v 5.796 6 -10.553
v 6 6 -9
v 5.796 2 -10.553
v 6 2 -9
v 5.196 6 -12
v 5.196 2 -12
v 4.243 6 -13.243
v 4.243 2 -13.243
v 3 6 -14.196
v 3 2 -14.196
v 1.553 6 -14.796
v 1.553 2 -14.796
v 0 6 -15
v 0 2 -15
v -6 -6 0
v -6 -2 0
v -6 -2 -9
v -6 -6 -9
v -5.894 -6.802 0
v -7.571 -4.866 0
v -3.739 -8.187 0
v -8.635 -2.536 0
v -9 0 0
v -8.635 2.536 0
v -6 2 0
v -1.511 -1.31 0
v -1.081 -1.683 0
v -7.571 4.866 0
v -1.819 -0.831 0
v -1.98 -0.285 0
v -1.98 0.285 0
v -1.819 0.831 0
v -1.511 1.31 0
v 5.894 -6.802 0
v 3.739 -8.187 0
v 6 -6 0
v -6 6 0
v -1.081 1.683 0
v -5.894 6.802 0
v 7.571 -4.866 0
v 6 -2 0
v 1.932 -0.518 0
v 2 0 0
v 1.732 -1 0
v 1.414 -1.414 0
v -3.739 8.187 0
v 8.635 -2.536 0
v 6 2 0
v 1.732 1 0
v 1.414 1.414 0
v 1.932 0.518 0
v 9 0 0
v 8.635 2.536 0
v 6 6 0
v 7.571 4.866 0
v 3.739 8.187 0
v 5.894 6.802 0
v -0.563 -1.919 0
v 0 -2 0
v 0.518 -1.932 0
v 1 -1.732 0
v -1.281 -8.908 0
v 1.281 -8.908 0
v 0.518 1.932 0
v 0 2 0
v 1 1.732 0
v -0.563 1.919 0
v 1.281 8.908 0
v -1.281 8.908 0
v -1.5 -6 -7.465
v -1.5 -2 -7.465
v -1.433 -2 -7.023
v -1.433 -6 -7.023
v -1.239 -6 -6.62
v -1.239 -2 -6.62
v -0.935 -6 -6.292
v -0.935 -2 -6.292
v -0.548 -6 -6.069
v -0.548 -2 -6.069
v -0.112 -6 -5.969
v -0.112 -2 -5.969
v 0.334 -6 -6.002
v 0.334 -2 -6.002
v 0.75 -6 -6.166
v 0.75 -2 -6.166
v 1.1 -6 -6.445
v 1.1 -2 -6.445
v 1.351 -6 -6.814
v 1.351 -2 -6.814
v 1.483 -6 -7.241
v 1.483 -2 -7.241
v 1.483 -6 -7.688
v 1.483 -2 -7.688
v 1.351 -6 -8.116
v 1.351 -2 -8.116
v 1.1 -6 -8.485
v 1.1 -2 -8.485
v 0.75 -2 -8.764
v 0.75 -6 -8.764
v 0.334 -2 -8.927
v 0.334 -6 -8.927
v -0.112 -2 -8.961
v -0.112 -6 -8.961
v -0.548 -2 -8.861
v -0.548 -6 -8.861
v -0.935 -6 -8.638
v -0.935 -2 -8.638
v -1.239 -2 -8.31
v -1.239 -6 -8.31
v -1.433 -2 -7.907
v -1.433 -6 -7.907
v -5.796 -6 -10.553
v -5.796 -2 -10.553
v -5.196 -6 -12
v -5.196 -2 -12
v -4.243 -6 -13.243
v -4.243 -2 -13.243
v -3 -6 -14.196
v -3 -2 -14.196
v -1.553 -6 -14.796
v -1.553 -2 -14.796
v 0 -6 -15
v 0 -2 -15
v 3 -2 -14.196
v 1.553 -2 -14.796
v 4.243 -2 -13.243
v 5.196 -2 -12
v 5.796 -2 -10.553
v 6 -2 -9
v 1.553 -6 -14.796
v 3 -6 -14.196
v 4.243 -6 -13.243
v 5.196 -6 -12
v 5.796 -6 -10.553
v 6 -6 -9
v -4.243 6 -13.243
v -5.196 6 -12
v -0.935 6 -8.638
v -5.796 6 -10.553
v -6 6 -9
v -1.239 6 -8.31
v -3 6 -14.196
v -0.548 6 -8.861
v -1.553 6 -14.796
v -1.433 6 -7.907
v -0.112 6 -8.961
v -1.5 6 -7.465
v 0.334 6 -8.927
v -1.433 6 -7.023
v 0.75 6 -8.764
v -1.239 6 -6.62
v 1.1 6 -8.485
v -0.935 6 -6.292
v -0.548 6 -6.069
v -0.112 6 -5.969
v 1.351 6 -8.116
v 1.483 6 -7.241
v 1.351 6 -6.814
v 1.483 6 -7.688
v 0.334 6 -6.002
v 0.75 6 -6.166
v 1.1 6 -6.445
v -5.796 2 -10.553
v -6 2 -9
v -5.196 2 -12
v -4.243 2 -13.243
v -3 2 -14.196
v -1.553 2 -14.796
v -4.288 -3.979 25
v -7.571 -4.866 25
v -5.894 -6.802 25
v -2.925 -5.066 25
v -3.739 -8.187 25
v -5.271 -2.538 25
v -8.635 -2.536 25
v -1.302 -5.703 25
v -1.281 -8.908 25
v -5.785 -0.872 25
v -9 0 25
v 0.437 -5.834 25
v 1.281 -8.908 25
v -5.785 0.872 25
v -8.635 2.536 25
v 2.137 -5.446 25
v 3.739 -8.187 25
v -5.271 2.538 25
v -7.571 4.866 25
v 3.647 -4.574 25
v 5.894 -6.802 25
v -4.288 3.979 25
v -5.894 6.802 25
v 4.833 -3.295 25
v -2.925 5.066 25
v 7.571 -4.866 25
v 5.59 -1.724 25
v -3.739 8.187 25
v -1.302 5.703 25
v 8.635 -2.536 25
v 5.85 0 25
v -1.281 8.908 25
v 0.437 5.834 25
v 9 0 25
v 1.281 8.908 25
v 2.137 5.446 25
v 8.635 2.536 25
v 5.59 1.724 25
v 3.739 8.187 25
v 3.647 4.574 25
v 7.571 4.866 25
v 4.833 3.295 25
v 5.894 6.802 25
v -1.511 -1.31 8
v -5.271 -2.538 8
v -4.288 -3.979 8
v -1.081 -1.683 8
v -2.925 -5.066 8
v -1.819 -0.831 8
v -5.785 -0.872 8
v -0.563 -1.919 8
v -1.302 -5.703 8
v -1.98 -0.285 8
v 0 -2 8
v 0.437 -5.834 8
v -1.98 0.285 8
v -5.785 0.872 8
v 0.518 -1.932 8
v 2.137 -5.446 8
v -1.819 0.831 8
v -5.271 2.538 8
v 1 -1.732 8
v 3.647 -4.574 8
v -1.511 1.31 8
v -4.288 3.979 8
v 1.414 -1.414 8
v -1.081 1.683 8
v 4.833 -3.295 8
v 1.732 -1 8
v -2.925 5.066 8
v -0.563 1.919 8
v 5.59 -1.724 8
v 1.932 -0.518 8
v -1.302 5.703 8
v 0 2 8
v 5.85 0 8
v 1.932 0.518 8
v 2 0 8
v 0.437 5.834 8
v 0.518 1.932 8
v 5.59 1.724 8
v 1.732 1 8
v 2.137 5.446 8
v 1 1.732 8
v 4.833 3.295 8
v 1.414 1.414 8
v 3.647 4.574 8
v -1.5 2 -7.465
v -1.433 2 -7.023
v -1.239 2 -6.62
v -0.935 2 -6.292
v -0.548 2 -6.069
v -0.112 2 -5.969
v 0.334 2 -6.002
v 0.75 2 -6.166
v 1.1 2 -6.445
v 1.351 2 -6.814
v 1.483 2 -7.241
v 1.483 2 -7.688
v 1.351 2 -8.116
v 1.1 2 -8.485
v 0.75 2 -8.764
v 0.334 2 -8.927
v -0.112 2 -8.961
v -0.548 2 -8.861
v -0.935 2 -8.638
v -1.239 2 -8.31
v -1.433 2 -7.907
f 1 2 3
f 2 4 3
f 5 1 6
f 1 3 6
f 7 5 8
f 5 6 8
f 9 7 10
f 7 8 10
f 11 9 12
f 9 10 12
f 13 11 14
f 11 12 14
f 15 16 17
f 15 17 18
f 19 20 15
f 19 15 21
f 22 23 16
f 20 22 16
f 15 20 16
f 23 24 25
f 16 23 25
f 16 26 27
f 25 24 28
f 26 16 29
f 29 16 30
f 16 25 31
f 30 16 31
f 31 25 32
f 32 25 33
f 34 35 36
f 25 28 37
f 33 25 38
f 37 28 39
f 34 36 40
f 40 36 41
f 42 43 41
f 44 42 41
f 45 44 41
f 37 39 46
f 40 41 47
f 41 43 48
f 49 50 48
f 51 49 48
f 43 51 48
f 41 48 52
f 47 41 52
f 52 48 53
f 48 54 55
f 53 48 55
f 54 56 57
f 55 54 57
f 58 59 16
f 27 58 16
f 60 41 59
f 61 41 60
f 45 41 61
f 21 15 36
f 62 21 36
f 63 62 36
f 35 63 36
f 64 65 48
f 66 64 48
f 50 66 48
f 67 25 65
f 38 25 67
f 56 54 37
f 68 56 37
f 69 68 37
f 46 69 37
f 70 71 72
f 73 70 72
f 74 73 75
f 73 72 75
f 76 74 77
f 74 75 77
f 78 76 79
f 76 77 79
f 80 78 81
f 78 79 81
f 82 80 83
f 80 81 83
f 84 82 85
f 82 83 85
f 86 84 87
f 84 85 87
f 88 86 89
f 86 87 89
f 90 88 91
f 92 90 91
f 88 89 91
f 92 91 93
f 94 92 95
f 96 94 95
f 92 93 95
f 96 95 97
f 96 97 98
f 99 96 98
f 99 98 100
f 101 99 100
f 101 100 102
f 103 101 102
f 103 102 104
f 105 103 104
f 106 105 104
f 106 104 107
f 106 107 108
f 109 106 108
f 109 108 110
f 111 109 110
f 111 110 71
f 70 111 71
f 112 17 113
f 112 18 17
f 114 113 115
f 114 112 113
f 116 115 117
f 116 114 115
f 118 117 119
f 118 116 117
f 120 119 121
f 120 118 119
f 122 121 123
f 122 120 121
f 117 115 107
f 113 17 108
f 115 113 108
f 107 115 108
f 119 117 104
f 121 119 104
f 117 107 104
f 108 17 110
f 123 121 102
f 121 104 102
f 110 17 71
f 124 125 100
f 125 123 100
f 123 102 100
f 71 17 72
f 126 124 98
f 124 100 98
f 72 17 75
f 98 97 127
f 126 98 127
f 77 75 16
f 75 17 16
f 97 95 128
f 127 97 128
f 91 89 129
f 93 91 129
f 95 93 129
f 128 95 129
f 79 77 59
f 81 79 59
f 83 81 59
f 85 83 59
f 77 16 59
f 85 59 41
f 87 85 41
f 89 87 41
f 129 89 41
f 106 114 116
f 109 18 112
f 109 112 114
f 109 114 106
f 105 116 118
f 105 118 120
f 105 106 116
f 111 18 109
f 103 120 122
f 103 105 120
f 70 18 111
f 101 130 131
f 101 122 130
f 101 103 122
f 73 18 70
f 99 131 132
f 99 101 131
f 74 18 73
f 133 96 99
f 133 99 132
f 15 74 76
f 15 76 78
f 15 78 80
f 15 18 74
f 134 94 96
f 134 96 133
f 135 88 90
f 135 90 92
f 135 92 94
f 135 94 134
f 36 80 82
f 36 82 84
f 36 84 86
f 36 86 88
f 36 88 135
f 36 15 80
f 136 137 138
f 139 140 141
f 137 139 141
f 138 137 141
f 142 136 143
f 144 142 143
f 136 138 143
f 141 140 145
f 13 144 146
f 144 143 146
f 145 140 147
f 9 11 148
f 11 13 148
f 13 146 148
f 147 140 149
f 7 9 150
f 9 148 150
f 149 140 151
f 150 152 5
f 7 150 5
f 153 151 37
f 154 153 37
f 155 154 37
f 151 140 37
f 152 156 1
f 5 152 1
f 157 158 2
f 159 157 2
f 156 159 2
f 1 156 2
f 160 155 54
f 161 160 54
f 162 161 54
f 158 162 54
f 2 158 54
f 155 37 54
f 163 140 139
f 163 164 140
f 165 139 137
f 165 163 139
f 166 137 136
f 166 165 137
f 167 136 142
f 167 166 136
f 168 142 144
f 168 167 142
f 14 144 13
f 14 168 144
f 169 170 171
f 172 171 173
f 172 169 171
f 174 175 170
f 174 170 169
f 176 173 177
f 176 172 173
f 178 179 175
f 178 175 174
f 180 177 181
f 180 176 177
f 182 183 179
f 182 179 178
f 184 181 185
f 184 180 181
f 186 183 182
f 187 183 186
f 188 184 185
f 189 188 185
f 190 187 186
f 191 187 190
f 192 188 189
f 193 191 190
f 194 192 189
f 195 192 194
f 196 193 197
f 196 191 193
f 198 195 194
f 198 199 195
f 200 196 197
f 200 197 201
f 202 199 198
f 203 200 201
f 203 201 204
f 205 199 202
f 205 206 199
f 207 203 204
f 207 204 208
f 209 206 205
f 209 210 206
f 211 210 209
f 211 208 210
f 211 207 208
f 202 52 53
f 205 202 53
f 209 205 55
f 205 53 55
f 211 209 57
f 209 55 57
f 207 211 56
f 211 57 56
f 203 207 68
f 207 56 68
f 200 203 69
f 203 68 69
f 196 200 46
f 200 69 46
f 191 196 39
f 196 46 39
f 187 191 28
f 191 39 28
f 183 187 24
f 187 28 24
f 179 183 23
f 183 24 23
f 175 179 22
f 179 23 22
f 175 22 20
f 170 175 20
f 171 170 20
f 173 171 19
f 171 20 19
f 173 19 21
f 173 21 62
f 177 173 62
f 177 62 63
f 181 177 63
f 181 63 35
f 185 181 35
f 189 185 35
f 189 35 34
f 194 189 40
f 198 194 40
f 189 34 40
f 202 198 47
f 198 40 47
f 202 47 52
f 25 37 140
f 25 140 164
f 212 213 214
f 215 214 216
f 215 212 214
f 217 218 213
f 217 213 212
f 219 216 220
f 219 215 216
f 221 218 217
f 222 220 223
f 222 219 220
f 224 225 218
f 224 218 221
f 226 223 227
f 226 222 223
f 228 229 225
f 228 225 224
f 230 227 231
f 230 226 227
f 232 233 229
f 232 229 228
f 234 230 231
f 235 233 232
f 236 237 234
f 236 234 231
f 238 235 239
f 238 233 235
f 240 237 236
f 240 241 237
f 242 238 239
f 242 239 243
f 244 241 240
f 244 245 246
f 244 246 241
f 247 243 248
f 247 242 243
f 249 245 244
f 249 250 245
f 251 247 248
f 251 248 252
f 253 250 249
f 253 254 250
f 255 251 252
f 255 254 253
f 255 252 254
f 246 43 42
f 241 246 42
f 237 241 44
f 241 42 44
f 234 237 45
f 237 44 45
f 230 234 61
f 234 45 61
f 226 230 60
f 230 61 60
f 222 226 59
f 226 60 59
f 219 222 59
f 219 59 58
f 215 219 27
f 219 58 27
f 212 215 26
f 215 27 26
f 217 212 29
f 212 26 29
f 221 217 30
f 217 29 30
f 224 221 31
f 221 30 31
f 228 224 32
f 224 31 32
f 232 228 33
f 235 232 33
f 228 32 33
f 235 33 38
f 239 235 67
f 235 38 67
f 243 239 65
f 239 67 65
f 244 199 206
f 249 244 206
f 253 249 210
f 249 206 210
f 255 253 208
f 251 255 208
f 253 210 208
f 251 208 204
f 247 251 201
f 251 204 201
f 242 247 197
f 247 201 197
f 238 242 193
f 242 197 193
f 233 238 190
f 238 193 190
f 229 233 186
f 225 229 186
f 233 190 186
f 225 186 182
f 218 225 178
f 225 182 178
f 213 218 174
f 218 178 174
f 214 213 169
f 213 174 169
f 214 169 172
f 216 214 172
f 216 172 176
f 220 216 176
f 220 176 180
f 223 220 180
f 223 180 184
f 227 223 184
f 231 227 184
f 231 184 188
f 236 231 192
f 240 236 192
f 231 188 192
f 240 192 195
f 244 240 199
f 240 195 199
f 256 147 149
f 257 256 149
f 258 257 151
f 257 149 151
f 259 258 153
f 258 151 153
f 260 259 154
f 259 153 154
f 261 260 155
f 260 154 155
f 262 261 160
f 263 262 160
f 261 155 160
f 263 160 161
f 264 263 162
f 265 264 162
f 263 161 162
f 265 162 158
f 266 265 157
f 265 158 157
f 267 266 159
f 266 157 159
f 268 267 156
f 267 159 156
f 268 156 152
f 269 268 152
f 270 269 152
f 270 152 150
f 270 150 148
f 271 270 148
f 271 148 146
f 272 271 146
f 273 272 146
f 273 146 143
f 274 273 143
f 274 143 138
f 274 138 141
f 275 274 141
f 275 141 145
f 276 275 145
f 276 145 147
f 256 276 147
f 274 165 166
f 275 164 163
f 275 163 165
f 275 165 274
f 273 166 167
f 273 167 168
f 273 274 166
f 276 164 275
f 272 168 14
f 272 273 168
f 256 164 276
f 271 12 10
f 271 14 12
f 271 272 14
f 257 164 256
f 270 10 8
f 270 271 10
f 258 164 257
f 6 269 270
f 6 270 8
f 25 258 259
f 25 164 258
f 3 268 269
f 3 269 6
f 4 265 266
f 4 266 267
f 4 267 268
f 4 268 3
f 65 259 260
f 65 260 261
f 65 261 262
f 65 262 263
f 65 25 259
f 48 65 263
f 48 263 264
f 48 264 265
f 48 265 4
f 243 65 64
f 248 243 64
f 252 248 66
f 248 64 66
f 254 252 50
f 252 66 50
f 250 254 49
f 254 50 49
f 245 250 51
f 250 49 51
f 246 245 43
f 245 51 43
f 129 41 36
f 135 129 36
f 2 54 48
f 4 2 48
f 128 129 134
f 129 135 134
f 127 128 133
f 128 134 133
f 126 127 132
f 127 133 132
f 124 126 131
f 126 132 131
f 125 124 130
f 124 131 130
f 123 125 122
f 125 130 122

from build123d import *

# Parameters (mm, degrees)
F0_R      = 9
F1_DEPTH  = 25
F2_W      = 12
F2_H      = 4
F3_DEPTH  = 15
F4_R      = 1.5
F5_DEPTH  = 12
F6_R      = 5.99999
F7_R      = 5.85
F8_DEPTH  = 17
F10_DEPTH = 8


# Not quite as in the source:
# - a fillet or chamfer is up to 0.001 mm smaller than in the source, because OpenCascade refuses the exact size


with BuildPart() as f1:
    # F0 (on Top) → F1 (new body)
    with BuildSketch(Plane.XY):
        Circle(F0_R)
    extrude(amount=F1_DEPTH)

    # F2 (on face) → F3 (join)
    with BuildSketch(Plane(origin=(0, 0, 0), x_dir=(1, 0, 0), z_dir=(0, 0, -1))):
        with Locations((0, -4)):
            Rectangle(F2_W, F2_H)
        with Locations((0, 4)):
            Rectangle(F2_W, F2_H)
    extrude(amount=F3_DEPTH)

    # F4 (on face) → F5 (cut, through all)
    with BuildSketch(Plane(origin=(0, 6, 0), x_dir=(-1, 0, 0), z_dir=(0, 1, 0))):
        with Locations((0, -7.464856375)):
            Circle(F4_R)
    extrude(amount=-F5_DEPTH, mode=Mode.SUBTRACT)

    # F6 (radius 6 in the source; OpenCascade refuses exactly that, so slightly less here)
    f6_edges = [f1.edges().sort_by_distance(p)[0] for p in [
        (-6, 4, -15),
        (-6, -4, -15),
        (6, -4, -15),
        (6, 4, -15),
    ]]
    fillet(f6_edges, radius=F6_R)

    # F7 (on face) → F8 (cut)
    with BuildSketch(Plane.XY.offset(25)):
        Circle(F7_R)
    extrude(amount=-F8_DEPTH, mode=Mode.SUBTRACT)

    # F9 (on face) → F10 (cut, through all)
    with BuildSketch(Plane(origin=(0, 0, 0), x_dir=(1, 0, 0), z_dir=(0, 0, -1))):
        with BuildLine():
            ThreePointArc((0, -2), (1.4142135624, -1.4142135624), (2, 0))
            ThreePointArc((2, 0), (1.4142135624, 1.4142135624), (0, 2))
            ThreePointArc((0, 2), (-2, 0), (0, -2))
        make_face()
    extrude(amount=-F10_DEPTH, mode=Mode.SUBTRACT)


solid = f1.part
